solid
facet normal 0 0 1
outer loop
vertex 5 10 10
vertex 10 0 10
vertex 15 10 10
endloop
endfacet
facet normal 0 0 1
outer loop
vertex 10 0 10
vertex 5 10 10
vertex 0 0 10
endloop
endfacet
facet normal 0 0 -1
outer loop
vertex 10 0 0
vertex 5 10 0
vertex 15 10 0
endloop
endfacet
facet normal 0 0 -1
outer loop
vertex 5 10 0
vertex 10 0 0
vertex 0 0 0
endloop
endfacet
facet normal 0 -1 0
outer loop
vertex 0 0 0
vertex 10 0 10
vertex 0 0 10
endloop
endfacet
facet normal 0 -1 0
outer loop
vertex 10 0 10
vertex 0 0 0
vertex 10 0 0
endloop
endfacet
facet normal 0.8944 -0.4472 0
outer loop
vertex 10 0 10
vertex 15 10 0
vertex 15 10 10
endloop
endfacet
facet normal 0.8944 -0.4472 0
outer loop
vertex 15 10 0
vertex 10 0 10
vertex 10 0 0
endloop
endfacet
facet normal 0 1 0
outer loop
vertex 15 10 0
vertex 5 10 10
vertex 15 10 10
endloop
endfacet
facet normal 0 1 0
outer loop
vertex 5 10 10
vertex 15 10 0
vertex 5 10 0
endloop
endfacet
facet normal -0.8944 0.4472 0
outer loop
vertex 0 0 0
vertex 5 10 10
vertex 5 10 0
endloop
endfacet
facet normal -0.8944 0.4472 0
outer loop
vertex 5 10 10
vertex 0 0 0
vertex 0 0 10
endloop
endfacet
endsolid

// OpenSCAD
// Construct: multmatrix() applying an explicit affine (a shear).
multmatrix([[1, 0.5, 0, 0],
            [0, 1,   0, 0],
            [0, 0,   1, 0]]) cube(10);
